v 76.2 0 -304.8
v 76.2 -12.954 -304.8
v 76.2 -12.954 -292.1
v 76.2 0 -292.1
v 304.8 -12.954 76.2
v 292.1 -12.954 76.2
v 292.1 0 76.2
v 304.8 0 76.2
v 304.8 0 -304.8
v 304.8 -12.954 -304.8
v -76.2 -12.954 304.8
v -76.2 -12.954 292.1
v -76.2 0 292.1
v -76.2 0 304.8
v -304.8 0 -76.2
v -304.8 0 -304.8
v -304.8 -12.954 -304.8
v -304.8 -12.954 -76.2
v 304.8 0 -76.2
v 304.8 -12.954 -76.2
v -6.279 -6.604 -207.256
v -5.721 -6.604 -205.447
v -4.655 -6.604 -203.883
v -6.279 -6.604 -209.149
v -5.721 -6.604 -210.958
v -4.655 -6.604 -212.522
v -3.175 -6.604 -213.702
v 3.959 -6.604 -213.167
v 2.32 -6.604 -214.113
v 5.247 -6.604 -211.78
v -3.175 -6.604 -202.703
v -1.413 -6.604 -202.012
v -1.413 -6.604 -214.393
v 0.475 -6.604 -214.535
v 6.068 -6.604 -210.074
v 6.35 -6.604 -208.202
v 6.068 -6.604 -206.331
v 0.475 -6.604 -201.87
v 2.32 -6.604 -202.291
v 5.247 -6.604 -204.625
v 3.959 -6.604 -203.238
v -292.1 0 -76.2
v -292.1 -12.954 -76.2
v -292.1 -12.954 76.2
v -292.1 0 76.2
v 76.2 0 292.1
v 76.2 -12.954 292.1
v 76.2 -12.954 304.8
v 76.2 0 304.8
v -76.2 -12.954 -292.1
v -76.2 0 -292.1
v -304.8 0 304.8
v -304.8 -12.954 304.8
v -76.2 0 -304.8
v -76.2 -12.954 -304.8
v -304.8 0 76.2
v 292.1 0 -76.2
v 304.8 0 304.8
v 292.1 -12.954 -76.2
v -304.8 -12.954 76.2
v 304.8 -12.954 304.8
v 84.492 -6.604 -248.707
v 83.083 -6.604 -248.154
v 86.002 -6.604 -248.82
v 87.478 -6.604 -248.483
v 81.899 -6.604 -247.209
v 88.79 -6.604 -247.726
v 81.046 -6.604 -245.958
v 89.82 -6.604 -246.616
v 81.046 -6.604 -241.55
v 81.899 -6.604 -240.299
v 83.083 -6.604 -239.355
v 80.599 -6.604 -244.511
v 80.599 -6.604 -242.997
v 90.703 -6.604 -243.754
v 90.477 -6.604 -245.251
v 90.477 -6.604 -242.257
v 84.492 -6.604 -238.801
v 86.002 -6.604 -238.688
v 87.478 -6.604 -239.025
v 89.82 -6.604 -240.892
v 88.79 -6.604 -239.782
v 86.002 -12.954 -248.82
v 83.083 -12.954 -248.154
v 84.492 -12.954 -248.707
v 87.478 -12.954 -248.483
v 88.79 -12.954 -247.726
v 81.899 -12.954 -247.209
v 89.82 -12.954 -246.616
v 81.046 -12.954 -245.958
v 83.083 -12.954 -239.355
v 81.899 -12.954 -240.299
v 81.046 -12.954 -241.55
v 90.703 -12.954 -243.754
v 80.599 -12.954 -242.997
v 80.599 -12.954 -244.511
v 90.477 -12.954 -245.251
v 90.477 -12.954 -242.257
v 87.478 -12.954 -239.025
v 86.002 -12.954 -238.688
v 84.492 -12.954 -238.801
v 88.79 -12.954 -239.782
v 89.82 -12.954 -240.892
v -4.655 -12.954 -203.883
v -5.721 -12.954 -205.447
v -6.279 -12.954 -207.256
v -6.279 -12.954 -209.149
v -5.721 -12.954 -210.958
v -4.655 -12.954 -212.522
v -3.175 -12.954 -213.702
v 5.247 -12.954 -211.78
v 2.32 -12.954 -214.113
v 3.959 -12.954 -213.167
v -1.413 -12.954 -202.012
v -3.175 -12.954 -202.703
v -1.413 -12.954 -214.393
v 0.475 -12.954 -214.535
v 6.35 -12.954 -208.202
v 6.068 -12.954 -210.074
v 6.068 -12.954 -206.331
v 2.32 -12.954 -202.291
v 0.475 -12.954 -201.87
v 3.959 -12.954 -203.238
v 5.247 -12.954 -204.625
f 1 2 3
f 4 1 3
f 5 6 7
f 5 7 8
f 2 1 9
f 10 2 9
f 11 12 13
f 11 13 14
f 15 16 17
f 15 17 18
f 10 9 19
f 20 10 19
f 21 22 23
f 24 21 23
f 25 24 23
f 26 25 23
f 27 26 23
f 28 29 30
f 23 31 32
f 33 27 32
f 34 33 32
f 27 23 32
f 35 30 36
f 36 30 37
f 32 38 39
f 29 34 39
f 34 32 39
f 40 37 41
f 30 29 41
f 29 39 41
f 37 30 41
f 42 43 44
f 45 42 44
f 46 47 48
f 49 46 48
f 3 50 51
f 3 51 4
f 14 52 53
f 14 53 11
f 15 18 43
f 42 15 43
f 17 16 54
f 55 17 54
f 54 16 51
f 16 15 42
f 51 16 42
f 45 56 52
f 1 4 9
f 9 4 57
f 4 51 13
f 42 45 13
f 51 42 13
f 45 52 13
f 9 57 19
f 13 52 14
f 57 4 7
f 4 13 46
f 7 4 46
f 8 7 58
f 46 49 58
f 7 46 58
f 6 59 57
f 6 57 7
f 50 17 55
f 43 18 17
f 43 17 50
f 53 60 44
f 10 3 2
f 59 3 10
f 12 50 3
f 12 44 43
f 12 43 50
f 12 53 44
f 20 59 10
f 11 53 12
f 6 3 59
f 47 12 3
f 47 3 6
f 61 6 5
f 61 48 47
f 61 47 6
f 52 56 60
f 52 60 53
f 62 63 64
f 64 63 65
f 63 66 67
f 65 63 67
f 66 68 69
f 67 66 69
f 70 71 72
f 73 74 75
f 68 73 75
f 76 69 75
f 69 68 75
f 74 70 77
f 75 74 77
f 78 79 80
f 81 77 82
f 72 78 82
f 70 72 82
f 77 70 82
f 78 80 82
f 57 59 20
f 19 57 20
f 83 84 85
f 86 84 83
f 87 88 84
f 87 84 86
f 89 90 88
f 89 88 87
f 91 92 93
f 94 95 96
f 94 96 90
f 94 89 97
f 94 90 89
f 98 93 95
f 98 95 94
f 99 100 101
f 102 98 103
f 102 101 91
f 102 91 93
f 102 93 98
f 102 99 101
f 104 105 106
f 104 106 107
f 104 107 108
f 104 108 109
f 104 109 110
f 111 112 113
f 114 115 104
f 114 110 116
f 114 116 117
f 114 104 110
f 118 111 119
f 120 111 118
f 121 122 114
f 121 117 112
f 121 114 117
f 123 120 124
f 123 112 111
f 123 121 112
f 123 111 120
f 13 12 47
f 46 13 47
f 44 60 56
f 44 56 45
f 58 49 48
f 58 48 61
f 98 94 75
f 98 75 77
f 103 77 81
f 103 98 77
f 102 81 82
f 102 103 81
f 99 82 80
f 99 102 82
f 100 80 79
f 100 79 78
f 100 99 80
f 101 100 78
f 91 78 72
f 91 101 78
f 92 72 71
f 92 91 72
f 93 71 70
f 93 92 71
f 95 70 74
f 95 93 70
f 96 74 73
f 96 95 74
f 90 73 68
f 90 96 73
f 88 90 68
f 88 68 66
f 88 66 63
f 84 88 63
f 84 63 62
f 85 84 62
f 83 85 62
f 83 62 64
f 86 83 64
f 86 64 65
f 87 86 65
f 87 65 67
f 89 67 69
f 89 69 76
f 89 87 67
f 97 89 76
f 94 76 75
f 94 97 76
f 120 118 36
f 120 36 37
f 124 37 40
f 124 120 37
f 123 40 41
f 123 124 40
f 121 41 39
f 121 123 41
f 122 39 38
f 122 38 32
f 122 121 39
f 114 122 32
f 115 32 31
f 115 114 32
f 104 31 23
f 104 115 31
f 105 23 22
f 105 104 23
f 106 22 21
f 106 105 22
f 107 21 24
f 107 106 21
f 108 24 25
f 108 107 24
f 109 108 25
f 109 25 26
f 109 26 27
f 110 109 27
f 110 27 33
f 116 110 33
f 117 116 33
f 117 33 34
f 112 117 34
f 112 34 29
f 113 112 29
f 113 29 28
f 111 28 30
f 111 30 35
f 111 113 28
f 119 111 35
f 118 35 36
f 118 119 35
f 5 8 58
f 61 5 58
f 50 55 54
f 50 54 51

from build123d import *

# Parameters (mm, degrees)
F0_W     = 609.6
F0_H     = 609.6
F1_DEPTH = 12.954
F2_R     = 6.35
F2_R_2   = 5.08
F3_DEPTH = 6.35
F2_W     = 152.4
F2_H     = 12.7
F2_W_2   = 12.7
F2_H_2   = 152.4
F4_DEPTH = 12.954


with BuildPart() as f1:
    # F0 (on Front) → F1 (new body)
    with BuildSketch(Plane.XZ):
        Rectangle(F0_W, F0_H)
    extrude(amount=F1_DEPTH)

    # F2 (on face) → F4 (cut)
    with BuildSketch(Plane.XZ.offset(12.954)):
        with Locations((0, -298.45)):
            Rectangle(F2_W, F2_H)
        with Locations((298.45, 0)):
            Rectangle(F2_W_2, F2_H_2)
        with Locations((0, 298.45)):
            Rectangle(F2_W, F2_H)
        with Locations((-298.45, 0)):
            Rectangle(F2_W_2, F2_H_2)
    extrude(amount=-F4_DEPTH, mode=Mode.SUBTRACT)


with BuildPart() as f3:
    # F2 (on face) → F3 (new body)
    with BuildSketch(Plane.XZ.offset(12.954)):
        with Locations((0, -208.202451)):
            Circle(F2_R)
        with Locations((85.622561, -243.75412)):
            Circle(F2_R_2)
    extrude(amount=-F3_DEPTH)


solid = Compound([f1.part, f3.part])
